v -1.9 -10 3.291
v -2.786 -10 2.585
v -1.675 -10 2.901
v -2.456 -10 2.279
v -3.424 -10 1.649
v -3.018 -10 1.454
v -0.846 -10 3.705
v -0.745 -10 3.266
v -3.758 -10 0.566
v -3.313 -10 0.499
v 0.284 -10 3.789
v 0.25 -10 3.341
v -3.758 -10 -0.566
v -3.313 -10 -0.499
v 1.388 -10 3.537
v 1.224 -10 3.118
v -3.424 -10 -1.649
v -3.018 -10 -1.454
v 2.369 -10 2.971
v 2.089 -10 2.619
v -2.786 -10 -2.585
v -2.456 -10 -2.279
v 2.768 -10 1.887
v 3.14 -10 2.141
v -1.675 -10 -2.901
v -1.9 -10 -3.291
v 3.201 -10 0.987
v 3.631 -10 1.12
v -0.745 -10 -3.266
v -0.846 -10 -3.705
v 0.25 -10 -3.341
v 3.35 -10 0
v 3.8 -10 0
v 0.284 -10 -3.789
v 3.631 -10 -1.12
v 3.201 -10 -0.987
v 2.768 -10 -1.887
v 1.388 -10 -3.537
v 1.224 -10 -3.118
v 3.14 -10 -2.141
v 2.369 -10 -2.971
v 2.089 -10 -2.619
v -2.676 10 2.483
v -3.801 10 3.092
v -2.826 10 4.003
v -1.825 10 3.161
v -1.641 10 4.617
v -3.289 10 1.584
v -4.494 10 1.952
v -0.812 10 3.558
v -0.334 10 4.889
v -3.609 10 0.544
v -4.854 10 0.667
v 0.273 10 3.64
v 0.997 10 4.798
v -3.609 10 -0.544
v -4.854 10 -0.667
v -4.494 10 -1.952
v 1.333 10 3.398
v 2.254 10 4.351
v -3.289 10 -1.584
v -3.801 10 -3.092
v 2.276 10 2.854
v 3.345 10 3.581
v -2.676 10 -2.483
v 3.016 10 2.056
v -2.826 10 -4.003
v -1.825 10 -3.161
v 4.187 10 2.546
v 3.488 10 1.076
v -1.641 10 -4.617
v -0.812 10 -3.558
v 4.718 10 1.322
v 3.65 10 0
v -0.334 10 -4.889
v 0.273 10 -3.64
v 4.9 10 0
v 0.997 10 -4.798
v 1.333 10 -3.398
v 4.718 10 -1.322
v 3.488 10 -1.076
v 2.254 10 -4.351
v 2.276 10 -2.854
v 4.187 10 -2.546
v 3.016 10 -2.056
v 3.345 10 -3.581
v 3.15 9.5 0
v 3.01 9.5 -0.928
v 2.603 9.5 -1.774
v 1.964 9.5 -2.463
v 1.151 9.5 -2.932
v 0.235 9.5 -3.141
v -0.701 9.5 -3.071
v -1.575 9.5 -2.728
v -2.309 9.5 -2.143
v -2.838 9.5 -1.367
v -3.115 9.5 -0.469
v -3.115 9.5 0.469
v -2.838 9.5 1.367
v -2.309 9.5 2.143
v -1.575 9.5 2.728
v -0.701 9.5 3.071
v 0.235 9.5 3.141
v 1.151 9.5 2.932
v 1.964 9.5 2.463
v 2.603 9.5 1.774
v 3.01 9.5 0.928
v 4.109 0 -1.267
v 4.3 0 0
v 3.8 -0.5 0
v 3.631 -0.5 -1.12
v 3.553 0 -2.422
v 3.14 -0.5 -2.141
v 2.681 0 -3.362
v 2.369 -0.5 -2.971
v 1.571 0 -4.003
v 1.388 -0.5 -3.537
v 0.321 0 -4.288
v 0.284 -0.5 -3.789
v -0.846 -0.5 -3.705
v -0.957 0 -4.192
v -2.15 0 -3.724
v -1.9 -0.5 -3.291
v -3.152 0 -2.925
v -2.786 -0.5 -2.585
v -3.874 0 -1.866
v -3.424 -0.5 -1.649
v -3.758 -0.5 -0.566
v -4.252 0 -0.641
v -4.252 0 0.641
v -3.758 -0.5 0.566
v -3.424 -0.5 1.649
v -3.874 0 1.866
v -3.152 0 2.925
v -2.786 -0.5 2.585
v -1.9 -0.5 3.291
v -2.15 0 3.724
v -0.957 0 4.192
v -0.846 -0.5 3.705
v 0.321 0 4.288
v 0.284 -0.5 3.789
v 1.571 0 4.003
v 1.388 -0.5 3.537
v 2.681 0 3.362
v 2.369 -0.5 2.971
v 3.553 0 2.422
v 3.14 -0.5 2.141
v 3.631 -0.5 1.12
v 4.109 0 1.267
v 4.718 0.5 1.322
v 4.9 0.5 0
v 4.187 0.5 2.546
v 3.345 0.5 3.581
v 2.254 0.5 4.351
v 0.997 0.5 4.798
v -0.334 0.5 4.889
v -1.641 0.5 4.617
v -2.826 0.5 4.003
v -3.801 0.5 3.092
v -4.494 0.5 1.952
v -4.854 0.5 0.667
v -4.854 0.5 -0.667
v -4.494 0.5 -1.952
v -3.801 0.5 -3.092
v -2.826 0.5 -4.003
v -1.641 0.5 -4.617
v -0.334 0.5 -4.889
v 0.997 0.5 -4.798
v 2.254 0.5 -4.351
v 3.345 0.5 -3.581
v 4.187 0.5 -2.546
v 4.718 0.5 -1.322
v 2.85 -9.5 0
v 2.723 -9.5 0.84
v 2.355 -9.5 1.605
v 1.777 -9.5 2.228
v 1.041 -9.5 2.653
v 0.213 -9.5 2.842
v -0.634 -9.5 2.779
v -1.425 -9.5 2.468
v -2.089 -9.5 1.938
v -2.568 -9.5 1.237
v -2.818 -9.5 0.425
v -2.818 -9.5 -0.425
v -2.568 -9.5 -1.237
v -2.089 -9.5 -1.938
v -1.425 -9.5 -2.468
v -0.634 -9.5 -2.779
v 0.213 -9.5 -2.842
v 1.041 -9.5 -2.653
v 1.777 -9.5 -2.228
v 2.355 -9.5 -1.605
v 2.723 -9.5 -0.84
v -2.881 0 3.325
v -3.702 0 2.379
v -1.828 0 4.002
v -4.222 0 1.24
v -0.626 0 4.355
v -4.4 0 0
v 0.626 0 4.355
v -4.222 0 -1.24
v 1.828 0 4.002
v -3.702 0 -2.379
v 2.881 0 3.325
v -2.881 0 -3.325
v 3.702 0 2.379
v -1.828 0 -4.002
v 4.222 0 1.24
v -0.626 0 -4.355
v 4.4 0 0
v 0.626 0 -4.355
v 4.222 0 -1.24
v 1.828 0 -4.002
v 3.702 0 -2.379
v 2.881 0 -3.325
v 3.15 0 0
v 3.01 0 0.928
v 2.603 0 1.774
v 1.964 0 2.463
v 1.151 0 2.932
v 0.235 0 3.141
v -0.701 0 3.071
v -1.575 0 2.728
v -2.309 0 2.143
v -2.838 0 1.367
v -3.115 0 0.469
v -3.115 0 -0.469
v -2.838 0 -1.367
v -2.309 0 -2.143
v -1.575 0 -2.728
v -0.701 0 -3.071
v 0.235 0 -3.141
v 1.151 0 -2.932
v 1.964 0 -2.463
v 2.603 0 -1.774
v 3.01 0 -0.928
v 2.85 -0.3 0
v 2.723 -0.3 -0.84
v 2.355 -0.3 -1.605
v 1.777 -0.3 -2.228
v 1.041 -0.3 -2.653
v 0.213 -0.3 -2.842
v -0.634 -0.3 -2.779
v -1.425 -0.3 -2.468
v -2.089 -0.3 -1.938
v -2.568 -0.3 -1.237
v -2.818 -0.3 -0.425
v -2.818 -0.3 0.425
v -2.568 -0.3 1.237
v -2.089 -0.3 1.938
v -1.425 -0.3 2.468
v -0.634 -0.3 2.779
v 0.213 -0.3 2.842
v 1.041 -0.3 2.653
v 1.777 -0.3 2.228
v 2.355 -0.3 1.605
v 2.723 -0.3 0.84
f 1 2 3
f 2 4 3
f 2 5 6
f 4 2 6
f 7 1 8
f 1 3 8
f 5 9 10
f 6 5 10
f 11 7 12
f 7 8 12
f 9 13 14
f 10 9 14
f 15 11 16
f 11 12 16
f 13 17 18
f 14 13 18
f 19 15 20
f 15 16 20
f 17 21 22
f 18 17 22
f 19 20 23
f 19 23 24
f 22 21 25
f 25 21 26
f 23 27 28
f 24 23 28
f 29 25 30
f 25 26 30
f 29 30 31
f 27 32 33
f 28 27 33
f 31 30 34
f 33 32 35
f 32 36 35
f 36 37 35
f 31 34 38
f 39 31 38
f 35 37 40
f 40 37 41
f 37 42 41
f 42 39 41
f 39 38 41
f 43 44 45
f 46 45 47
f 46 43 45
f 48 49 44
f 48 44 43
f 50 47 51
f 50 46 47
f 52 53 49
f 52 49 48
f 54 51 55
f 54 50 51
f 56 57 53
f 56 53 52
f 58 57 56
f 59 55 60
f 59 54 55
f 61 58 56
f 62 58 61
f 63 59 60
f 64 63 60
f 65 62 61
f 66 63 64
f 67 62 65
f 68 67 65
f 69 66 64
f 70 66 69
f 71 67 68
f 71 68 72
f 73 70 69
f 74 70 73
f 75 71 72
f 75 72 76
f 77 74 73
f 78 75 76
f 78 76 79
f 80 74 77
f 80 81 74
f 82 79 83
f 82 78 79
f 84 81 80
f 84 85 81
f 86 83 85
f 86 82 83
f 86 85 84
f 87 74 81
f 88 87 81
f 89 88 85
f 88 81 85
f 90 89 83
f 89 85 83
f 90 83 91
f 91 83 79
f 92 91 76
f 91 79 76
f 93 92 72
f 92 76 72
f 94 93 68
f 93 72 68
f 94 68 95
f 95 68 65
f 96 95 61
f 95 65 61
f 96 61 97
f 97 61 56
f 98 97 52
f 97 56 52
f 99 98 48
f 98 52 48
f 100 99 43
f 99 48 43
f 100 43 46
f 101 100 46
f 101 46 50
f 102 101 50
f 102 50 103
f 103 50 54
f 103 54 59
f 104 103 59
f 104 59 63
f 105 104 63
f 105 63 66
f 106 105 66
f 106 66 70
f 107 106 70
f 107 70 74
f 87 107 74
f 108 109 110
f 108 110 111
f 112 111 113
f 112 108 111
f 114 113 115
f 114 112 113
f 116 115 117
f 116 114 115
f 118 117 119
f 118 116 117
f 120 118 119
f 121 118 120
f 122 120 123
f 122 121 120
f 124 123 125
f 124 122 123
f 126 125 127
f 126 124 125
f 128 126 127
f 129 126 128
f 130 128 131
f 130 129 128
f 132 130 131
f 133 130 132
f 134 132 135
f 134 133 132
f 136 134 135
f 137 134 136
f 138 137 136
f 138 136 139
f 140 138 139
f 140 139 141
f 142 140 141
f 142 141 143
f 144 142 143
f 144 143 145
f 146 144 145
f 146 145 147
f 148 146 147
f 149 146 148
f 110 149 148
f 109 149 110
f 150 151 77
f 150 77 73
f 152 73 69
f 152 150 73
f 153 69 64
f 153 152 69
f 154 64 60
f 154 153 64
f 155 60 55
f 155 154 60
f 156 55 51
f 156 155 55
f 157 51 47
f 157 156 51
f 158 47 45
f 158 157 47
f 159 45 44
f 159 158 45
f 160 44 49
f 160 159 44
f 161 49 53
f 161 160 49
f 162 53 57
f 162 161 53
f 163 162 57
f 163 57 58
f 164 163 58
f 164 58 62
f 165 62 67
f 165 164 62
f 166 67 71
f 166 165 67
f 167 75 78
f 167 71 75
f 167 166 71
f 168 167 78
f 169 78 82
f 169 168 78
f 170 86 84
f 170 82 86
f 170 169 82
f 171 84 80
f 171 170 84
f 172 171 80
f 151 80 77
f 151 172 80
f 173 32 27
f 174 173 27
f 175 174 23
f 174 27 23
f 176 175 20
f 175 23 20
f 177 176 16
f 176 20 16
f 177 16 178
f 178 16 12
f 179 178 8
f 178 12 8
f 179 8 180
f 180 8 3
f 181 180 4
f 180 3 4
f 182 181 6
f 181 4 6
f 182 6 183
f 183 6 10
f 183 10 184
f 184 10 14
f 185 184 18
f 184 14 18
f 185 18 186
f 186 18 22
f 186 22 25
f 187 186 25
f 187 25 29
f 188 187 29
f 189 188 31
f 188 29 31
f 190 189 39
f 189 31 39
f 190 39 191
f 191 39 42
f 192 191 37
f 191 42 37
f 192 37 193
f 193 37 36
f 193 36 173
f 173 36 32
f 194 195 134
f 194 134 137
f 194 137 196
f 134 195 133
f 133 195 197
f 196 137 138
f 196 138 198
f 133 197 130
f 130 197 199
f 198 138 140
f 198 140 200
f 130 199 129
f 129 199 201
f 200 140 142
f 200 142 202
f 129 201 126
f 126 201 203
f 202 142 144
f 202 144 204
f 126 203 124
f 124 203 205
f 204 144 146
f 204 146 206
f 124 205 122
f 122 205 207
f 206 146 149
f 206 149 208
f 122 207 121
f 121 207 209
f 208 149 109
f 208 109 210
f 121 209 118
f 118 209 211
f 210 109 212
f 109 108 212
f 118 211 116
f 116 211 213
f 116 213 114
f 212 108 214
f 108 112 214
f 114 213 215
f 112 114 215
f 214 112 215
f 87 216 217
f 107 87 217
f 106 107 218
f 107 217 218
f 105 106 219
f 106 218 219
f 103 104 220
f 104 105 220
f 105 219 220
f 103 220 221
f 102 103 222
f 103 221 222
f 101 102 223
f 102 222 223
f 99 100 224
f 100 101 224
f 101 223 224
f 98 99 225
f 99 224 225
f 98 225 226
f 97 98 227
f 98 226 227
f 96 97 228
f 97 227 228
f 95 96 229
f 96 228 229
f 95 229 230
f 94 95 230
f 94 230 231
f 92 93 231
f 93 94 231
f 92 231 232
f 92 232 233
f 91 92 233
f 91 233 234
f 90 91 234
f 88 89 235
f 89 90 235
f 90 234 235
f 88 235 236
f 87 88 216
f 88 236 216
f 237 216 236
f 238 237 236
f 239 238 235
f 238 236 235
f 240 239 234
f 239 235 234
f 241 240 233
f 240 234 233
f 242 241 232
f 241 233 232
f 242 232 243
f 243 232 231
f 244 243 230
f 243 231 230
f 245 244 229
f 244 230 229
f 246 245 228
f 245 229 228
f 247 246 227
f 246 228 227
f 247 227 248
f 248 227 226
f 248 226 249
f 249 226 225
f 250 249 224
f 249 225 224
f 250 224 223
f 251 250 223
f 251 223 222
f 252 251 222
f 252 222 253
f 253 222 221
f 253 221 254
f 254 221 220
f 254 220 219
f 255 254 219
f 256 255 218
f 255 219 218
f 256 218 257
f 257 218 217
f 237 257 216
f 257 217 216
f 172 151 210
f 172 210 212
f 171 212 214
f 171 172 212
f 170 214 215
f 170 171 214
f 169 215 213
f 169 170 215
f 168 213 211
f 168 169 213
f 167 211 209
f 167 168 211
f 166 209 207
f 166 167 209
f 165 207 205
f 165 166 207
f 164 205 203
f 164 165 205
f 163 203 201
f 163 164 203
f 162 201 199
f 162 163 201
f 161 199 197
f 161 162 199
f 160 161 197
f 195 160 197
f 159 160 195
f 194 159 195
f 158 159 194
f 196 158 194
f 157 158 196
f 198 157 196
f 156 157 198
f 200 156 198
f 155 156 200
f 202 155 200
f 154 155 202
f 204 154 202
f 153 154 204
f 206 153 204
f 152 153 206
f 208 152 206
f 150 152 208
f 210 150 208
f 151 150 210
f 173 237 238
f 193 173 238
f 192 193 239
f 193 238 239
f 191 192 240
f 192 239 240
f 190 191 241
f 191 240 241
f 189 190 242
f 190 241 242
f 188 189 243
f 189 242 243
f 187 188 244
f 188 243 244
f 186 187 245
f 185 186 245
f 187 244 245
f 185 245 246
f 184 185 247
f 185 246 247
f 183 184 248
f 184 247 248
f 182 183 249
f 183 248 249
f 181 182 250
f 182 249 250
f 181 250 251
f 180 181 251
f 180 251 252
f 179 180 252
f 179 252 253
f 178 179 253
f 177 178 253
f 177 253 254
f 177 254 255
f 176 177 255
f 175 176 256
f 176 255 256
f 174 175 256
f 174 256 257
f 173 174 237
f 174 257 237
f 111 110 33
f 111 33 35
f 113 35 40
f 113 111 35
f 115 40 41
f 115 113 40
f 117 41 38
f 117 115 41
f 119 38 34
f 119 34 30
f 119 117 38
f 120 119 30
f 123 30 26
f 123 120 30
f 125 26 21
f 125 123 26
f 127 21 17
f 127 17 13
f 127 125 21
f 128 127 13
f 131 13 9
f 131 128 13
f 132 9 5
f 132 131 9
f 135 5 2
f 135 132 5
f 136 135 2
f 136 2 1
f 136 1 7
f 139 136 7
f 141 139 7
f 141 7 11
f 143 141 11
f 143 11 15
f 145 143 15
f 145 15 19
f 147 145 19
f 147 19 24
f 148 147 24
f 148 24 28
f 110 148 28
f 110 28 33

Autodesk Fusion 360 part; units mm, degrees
sketch "Sketch1" plane through (0, 0, 0) normal (0, 1, 0) x (1, 0, 0)
  circle A0 centre (0, 0) radius 3.8
  circle A1 centre (0, 0) radius 4.9
  circle A2 centre (0, 0) radius 2.85
  circle A3 centre (0, 0) radius 3.15
  dimension "d1" = 7.6
  dimension "d2" = 9.8
  dimension "d3" = 5.7
  dimension "d4" = 6.3
extrude "Extrude1" add sketch "Sketch1" against normal blind 10 contours A0 | A3
extrude "Extrude2" add sketch "Sketch1" along normal blind 10 contours A0 | A1
chamfer "Chamfer1" distance 0.5 angle 45 1 edges at (-3.5428, 0, 1.3741)
chamfer "Chamfer2" distance 0.3 angle 45 1 edges at (-2.6571, 0, -1.0306)
chamfer "Chamfer3" distance 0.5 angle 45 2 edges at (-2.6571, -10, 1.0306) (-2.9368, 10, -1.1391)
chamfer "Chamfer4" distance 0.5 angle 45 1 edges at (-4.5684, 0, 1.7719)
